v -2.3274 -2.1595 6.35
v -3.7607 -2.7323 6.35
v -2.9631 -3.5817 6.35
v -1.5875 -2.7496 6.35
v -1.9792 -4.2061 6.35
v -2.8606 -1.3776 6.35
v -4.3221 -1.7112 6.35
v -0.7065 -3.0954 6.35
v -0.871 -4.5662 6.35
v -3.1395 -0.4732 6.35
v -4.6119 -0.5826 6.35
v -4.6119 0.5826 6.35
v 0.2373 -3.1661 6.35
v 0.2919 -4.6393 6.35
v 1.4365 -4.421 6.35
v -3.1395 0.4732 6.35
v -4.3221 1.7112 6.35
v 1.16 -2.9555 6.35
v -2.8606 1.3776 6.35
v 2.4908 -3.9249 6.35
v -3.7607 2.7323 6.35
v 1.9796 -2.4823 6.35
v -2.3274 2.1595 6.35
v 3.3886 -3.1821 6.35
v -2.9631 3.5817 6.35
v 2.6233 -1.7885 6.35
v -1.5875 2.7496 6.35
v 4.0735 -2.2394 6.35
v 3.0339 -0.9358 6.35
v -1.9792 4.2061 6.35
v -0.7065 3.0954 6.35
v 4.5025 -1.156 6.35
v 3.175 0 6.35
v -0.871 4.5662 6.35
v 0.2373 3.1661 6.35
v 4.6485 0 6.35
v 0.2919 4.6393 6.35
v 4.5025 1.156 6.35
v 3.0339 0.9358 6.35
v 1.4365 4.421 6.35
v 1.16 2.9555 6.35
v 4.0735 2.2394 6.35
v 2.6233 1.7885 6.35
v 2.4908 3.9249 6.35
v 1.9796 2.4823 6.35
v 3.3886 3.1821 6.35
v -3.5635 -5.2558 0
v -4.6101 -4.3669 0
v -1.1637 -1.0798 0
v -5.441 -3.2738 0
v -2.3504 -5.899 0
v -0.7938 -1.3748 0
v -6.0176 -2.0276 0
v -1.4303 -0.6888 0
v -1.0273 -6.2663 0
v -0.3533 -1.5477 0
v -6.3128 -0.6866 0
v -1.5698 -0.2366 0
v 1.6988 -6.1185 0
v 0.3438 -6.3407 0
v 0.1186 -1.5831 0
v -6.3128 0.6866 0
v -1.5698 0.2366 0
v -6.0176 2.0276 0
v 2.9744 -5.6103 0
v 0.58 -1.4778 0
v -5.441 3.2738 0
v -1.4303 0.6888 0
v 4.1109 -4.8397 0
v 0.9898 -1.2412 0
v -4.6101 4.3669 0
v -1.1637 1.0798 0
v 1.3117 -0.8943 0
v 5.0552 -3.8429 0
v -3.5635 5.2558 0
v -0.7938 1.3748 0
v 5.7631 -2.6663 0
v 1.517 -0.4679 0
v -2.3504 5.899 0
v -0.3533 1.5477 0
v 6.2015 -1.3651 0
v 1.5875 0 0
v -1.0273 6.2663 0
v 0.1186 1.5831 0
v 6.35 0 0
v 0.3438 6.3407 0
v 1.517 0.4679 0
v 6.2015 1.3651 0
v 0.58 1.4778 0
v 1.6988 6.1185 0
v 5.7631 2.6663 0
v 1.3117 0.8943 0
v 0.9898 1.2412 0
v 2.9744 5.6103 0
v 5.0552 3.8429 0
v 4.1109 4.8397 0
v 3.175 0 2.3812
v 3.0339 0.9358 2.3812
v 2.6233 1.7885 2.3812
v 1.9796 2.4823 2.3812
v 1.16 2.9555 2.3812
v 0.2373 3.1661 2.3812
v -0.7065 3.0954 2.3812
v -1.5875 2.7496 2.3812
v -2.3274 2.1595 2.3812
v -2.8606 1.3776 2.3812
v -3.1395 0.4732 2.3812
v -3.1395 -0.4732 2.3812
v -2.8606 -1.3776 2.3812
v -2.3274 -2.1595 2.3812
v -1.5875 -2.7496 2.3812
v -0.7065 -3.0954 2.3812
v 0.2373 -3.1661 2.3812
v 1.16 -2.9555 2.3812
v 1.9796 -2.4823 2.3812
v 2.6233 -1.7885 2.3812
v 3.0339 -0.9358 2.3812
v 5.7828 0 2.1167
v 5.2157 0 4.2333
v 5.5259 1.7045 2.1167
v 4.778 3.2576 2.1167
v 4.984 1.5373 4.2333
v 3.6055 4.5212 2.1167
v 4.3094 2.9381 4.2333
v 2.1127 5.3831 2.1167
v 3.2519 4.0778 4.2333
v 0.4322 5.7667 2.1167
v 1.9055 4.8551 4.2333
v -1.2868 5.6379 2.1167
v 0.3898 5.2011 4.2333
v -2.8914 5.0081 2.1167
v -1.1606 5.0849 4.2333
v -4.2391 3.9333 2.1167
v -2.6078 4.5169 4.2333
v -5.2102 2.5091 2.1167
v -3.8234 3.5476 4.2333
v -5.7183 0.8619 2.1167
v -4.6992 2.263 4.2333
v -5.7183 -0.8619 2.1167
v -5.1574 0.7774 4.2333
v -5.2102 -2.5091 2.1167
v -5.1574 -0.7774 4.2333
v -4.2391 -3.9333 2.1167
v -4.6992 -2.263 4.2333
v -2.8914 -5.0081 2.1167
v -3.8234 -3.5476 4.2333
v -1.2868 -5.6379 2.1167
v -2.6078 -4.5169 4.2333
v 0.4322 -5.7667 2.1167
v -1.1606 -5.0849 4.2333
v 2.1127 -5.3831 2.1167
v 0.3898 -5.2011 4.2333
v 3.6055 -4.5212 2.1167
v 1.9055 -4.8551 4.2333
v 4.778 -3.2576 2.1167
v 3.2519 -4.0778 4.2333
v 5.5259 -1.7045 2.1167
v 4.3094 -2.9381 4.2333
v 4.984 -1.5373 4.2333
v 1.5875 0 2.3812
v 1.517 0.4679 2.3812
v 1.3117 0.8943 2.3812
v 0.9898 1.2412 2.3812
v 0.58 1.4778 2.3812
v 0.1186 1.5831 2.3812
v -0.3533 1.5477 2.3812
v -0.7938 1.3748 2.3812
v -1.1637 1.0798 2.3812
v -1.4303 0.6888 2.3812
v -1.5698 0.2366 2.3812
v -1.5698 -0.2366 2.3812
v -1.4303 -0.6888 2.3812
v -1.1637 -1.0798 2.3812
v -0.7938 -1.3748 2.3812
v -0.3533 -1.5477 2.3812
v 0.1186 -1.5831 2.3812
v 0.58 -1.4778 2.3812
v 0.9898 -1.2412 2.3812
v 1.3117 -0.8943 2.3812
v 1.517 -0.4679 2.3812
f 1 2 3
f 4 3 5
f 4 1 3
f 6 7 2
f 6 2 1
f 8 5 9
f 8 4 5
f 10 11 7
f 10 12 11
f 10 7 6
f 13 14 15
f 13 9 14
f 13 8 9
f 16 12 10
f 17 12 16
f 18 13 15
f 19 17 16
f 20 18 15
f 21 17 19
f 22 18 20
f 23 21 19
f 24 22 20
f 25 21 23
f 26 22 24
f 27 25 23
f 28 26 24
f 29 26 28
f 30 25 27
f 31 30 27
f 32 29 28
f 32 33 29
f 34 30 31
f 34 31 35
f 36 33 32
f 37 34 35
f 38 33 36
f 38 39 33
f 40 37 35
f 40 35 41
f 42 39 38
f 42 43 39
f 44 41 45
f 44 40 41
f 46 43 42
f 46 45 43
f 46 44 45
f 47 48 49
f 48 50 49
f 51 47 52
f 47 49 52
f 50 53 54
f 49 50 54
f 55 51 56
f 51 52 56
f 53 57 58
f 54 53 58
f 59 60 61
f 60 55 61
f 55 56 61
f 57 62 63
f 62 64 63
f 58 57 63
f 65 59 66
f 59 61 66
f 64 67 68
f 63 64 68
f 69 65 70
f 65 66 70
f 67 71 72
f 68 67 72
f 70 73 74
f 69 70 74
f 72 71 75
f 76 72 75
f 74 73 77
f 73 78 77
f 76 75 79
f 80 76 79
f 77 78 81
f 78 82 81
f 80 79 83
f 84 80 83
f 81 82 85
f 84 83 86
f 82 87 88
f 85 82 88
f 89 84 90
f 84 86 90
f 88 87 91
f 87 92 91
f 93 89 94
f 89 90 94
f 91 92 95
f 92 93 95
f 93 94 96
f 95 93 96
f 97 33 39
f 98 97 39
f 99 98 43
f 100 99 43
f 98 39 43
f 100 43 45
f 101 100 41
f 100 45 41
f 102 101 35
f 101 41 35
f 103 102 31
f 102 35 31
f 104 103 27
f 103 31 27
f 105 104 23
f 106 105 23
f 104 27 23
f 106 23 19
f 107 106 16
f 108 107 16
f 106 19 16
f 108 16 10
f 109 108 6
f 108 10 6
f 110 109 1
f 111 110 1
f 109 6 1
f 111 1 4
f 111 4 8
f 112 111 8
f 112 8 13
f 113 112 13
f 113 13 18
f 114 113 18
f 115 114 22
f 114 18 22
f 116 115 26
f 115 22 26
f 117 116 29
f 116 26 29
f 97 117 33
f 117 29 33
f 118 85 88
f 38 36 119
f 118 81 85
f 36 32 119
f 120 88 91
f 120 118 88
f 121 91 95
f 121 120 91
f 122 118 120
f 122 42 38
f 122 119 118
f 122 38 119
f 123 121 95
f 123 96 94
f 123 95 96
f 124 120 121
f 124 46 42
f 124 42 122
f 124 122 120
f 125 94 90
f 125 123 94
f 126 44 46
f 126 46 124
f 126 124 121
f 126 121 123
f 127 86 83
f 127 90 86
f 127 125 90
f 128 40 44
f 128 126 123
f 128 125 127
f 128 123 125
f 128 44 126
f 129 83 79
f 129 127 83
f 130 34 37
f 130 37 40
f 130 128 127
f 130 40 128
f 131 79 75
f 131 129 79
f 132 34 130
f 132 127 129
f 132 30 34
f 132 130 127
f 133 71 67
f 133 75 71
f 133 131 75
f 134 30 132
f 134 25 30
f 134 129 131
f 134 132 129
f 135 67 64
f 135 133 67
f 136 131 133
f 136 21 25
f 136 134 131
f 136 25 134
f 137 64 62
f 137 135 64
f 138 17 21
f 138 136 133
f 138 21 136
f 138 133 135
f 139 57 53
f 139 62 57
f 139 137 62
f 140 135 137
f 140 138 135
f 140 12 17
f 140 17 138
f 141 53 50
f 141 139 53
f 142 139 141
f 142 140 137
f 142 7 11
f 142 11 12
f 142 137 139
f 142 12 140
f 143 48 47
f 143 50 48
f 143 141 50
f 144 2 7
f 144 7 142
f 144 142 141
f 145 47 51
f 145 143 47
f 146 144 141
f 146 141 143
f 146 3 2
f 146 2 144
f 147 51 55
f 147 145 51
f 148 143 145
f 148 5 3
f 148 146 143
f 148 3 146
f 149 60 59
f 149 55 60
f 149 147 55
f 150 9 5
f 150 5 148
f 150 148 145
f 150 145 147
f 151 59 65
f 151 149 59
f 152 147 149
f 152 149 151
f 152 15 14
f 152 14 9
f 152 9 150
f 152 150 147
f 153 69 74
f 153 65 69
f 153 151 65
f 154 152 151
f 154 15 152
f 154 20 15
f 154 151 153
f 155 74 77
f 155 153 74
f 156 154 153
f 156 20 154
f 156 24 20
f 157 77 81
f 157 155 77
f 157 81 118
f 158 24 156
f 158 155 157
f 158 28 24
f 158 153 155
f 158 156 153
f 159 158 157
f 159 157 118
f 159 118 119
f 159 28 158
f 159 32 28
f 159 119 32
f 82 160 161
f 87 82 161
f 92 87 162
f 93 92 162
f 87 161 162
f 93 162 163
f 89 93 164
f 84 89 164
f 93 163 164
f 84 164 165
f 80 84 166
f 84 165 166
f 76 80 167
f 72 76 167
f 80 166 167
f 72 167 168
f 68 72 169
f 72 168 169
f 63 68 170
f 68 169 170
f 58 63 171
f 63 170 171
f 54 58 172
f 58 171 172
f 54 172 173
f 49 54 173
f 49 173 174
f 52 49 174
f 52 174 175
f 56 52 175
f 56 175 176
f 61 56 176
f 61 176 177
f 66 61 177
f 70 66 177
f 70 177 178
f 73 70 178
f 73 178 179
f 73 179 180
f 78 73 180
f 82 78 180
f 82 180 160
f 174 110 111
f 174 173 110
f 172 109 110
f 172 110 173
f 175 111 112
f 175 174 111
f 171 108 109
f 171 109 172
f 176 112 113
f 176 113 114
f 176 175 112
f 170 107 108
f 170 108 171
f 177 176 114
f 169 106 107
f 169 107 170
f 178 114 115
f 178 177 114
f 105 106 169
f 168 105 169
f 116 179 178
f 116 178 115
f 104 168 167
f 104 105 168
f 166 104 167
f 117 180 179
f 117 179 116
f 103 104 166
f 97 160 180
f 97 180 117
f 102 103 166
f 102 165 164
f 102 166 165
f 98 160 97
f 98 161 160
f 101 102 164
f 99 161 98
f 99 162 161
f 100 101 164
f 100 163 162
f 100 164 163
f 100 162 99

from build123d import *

# Parameters (mm, degrees)
SKETCH1_R           = 6.35
BOSS_EXTRUDE1_DEPTH = 6.35
BOSS_EXTRUDE1_TAPER = 15
SKETCH2_R           = 3.175
CUT_EXTRUDE1_DEPTH  = 3.96875
SKETCH3_R           = 1.5875
CUT_EXTRUDE2_DEPTH  = 3.38125


with BuildPart() as part:
    # Sketch1 → Boss-Extrude1 (new body)
    with BuildSketch(Plane.XY):
        Circle(SKETCH1_R)
    extrude(amount=BOSS_EXTRUDE1_DEPTH, taper=BOSS_EXTRUDE1_TAPER)

    # Sketch2 → Cut-Extrude1 (cut)
    with BuildSketch(Plane.XY.offset(6.35)):
        Circle(SKETCH2_R)
    extrude(amount=-CUT_EXTRUDE1_DEPTH, mode=Mode.SUBTRACT)

    # Sketch3 → Cut-Extrude2 (cut, through all)
    with BuildSketch(Plane.XY.offset(2.38125)):
        Circle(SKETCH3_R)
    extrude(amount=-CUT_EXTRUDE2_DEPTH, mode=Mode.SUBTRACT)


solid = part.part
